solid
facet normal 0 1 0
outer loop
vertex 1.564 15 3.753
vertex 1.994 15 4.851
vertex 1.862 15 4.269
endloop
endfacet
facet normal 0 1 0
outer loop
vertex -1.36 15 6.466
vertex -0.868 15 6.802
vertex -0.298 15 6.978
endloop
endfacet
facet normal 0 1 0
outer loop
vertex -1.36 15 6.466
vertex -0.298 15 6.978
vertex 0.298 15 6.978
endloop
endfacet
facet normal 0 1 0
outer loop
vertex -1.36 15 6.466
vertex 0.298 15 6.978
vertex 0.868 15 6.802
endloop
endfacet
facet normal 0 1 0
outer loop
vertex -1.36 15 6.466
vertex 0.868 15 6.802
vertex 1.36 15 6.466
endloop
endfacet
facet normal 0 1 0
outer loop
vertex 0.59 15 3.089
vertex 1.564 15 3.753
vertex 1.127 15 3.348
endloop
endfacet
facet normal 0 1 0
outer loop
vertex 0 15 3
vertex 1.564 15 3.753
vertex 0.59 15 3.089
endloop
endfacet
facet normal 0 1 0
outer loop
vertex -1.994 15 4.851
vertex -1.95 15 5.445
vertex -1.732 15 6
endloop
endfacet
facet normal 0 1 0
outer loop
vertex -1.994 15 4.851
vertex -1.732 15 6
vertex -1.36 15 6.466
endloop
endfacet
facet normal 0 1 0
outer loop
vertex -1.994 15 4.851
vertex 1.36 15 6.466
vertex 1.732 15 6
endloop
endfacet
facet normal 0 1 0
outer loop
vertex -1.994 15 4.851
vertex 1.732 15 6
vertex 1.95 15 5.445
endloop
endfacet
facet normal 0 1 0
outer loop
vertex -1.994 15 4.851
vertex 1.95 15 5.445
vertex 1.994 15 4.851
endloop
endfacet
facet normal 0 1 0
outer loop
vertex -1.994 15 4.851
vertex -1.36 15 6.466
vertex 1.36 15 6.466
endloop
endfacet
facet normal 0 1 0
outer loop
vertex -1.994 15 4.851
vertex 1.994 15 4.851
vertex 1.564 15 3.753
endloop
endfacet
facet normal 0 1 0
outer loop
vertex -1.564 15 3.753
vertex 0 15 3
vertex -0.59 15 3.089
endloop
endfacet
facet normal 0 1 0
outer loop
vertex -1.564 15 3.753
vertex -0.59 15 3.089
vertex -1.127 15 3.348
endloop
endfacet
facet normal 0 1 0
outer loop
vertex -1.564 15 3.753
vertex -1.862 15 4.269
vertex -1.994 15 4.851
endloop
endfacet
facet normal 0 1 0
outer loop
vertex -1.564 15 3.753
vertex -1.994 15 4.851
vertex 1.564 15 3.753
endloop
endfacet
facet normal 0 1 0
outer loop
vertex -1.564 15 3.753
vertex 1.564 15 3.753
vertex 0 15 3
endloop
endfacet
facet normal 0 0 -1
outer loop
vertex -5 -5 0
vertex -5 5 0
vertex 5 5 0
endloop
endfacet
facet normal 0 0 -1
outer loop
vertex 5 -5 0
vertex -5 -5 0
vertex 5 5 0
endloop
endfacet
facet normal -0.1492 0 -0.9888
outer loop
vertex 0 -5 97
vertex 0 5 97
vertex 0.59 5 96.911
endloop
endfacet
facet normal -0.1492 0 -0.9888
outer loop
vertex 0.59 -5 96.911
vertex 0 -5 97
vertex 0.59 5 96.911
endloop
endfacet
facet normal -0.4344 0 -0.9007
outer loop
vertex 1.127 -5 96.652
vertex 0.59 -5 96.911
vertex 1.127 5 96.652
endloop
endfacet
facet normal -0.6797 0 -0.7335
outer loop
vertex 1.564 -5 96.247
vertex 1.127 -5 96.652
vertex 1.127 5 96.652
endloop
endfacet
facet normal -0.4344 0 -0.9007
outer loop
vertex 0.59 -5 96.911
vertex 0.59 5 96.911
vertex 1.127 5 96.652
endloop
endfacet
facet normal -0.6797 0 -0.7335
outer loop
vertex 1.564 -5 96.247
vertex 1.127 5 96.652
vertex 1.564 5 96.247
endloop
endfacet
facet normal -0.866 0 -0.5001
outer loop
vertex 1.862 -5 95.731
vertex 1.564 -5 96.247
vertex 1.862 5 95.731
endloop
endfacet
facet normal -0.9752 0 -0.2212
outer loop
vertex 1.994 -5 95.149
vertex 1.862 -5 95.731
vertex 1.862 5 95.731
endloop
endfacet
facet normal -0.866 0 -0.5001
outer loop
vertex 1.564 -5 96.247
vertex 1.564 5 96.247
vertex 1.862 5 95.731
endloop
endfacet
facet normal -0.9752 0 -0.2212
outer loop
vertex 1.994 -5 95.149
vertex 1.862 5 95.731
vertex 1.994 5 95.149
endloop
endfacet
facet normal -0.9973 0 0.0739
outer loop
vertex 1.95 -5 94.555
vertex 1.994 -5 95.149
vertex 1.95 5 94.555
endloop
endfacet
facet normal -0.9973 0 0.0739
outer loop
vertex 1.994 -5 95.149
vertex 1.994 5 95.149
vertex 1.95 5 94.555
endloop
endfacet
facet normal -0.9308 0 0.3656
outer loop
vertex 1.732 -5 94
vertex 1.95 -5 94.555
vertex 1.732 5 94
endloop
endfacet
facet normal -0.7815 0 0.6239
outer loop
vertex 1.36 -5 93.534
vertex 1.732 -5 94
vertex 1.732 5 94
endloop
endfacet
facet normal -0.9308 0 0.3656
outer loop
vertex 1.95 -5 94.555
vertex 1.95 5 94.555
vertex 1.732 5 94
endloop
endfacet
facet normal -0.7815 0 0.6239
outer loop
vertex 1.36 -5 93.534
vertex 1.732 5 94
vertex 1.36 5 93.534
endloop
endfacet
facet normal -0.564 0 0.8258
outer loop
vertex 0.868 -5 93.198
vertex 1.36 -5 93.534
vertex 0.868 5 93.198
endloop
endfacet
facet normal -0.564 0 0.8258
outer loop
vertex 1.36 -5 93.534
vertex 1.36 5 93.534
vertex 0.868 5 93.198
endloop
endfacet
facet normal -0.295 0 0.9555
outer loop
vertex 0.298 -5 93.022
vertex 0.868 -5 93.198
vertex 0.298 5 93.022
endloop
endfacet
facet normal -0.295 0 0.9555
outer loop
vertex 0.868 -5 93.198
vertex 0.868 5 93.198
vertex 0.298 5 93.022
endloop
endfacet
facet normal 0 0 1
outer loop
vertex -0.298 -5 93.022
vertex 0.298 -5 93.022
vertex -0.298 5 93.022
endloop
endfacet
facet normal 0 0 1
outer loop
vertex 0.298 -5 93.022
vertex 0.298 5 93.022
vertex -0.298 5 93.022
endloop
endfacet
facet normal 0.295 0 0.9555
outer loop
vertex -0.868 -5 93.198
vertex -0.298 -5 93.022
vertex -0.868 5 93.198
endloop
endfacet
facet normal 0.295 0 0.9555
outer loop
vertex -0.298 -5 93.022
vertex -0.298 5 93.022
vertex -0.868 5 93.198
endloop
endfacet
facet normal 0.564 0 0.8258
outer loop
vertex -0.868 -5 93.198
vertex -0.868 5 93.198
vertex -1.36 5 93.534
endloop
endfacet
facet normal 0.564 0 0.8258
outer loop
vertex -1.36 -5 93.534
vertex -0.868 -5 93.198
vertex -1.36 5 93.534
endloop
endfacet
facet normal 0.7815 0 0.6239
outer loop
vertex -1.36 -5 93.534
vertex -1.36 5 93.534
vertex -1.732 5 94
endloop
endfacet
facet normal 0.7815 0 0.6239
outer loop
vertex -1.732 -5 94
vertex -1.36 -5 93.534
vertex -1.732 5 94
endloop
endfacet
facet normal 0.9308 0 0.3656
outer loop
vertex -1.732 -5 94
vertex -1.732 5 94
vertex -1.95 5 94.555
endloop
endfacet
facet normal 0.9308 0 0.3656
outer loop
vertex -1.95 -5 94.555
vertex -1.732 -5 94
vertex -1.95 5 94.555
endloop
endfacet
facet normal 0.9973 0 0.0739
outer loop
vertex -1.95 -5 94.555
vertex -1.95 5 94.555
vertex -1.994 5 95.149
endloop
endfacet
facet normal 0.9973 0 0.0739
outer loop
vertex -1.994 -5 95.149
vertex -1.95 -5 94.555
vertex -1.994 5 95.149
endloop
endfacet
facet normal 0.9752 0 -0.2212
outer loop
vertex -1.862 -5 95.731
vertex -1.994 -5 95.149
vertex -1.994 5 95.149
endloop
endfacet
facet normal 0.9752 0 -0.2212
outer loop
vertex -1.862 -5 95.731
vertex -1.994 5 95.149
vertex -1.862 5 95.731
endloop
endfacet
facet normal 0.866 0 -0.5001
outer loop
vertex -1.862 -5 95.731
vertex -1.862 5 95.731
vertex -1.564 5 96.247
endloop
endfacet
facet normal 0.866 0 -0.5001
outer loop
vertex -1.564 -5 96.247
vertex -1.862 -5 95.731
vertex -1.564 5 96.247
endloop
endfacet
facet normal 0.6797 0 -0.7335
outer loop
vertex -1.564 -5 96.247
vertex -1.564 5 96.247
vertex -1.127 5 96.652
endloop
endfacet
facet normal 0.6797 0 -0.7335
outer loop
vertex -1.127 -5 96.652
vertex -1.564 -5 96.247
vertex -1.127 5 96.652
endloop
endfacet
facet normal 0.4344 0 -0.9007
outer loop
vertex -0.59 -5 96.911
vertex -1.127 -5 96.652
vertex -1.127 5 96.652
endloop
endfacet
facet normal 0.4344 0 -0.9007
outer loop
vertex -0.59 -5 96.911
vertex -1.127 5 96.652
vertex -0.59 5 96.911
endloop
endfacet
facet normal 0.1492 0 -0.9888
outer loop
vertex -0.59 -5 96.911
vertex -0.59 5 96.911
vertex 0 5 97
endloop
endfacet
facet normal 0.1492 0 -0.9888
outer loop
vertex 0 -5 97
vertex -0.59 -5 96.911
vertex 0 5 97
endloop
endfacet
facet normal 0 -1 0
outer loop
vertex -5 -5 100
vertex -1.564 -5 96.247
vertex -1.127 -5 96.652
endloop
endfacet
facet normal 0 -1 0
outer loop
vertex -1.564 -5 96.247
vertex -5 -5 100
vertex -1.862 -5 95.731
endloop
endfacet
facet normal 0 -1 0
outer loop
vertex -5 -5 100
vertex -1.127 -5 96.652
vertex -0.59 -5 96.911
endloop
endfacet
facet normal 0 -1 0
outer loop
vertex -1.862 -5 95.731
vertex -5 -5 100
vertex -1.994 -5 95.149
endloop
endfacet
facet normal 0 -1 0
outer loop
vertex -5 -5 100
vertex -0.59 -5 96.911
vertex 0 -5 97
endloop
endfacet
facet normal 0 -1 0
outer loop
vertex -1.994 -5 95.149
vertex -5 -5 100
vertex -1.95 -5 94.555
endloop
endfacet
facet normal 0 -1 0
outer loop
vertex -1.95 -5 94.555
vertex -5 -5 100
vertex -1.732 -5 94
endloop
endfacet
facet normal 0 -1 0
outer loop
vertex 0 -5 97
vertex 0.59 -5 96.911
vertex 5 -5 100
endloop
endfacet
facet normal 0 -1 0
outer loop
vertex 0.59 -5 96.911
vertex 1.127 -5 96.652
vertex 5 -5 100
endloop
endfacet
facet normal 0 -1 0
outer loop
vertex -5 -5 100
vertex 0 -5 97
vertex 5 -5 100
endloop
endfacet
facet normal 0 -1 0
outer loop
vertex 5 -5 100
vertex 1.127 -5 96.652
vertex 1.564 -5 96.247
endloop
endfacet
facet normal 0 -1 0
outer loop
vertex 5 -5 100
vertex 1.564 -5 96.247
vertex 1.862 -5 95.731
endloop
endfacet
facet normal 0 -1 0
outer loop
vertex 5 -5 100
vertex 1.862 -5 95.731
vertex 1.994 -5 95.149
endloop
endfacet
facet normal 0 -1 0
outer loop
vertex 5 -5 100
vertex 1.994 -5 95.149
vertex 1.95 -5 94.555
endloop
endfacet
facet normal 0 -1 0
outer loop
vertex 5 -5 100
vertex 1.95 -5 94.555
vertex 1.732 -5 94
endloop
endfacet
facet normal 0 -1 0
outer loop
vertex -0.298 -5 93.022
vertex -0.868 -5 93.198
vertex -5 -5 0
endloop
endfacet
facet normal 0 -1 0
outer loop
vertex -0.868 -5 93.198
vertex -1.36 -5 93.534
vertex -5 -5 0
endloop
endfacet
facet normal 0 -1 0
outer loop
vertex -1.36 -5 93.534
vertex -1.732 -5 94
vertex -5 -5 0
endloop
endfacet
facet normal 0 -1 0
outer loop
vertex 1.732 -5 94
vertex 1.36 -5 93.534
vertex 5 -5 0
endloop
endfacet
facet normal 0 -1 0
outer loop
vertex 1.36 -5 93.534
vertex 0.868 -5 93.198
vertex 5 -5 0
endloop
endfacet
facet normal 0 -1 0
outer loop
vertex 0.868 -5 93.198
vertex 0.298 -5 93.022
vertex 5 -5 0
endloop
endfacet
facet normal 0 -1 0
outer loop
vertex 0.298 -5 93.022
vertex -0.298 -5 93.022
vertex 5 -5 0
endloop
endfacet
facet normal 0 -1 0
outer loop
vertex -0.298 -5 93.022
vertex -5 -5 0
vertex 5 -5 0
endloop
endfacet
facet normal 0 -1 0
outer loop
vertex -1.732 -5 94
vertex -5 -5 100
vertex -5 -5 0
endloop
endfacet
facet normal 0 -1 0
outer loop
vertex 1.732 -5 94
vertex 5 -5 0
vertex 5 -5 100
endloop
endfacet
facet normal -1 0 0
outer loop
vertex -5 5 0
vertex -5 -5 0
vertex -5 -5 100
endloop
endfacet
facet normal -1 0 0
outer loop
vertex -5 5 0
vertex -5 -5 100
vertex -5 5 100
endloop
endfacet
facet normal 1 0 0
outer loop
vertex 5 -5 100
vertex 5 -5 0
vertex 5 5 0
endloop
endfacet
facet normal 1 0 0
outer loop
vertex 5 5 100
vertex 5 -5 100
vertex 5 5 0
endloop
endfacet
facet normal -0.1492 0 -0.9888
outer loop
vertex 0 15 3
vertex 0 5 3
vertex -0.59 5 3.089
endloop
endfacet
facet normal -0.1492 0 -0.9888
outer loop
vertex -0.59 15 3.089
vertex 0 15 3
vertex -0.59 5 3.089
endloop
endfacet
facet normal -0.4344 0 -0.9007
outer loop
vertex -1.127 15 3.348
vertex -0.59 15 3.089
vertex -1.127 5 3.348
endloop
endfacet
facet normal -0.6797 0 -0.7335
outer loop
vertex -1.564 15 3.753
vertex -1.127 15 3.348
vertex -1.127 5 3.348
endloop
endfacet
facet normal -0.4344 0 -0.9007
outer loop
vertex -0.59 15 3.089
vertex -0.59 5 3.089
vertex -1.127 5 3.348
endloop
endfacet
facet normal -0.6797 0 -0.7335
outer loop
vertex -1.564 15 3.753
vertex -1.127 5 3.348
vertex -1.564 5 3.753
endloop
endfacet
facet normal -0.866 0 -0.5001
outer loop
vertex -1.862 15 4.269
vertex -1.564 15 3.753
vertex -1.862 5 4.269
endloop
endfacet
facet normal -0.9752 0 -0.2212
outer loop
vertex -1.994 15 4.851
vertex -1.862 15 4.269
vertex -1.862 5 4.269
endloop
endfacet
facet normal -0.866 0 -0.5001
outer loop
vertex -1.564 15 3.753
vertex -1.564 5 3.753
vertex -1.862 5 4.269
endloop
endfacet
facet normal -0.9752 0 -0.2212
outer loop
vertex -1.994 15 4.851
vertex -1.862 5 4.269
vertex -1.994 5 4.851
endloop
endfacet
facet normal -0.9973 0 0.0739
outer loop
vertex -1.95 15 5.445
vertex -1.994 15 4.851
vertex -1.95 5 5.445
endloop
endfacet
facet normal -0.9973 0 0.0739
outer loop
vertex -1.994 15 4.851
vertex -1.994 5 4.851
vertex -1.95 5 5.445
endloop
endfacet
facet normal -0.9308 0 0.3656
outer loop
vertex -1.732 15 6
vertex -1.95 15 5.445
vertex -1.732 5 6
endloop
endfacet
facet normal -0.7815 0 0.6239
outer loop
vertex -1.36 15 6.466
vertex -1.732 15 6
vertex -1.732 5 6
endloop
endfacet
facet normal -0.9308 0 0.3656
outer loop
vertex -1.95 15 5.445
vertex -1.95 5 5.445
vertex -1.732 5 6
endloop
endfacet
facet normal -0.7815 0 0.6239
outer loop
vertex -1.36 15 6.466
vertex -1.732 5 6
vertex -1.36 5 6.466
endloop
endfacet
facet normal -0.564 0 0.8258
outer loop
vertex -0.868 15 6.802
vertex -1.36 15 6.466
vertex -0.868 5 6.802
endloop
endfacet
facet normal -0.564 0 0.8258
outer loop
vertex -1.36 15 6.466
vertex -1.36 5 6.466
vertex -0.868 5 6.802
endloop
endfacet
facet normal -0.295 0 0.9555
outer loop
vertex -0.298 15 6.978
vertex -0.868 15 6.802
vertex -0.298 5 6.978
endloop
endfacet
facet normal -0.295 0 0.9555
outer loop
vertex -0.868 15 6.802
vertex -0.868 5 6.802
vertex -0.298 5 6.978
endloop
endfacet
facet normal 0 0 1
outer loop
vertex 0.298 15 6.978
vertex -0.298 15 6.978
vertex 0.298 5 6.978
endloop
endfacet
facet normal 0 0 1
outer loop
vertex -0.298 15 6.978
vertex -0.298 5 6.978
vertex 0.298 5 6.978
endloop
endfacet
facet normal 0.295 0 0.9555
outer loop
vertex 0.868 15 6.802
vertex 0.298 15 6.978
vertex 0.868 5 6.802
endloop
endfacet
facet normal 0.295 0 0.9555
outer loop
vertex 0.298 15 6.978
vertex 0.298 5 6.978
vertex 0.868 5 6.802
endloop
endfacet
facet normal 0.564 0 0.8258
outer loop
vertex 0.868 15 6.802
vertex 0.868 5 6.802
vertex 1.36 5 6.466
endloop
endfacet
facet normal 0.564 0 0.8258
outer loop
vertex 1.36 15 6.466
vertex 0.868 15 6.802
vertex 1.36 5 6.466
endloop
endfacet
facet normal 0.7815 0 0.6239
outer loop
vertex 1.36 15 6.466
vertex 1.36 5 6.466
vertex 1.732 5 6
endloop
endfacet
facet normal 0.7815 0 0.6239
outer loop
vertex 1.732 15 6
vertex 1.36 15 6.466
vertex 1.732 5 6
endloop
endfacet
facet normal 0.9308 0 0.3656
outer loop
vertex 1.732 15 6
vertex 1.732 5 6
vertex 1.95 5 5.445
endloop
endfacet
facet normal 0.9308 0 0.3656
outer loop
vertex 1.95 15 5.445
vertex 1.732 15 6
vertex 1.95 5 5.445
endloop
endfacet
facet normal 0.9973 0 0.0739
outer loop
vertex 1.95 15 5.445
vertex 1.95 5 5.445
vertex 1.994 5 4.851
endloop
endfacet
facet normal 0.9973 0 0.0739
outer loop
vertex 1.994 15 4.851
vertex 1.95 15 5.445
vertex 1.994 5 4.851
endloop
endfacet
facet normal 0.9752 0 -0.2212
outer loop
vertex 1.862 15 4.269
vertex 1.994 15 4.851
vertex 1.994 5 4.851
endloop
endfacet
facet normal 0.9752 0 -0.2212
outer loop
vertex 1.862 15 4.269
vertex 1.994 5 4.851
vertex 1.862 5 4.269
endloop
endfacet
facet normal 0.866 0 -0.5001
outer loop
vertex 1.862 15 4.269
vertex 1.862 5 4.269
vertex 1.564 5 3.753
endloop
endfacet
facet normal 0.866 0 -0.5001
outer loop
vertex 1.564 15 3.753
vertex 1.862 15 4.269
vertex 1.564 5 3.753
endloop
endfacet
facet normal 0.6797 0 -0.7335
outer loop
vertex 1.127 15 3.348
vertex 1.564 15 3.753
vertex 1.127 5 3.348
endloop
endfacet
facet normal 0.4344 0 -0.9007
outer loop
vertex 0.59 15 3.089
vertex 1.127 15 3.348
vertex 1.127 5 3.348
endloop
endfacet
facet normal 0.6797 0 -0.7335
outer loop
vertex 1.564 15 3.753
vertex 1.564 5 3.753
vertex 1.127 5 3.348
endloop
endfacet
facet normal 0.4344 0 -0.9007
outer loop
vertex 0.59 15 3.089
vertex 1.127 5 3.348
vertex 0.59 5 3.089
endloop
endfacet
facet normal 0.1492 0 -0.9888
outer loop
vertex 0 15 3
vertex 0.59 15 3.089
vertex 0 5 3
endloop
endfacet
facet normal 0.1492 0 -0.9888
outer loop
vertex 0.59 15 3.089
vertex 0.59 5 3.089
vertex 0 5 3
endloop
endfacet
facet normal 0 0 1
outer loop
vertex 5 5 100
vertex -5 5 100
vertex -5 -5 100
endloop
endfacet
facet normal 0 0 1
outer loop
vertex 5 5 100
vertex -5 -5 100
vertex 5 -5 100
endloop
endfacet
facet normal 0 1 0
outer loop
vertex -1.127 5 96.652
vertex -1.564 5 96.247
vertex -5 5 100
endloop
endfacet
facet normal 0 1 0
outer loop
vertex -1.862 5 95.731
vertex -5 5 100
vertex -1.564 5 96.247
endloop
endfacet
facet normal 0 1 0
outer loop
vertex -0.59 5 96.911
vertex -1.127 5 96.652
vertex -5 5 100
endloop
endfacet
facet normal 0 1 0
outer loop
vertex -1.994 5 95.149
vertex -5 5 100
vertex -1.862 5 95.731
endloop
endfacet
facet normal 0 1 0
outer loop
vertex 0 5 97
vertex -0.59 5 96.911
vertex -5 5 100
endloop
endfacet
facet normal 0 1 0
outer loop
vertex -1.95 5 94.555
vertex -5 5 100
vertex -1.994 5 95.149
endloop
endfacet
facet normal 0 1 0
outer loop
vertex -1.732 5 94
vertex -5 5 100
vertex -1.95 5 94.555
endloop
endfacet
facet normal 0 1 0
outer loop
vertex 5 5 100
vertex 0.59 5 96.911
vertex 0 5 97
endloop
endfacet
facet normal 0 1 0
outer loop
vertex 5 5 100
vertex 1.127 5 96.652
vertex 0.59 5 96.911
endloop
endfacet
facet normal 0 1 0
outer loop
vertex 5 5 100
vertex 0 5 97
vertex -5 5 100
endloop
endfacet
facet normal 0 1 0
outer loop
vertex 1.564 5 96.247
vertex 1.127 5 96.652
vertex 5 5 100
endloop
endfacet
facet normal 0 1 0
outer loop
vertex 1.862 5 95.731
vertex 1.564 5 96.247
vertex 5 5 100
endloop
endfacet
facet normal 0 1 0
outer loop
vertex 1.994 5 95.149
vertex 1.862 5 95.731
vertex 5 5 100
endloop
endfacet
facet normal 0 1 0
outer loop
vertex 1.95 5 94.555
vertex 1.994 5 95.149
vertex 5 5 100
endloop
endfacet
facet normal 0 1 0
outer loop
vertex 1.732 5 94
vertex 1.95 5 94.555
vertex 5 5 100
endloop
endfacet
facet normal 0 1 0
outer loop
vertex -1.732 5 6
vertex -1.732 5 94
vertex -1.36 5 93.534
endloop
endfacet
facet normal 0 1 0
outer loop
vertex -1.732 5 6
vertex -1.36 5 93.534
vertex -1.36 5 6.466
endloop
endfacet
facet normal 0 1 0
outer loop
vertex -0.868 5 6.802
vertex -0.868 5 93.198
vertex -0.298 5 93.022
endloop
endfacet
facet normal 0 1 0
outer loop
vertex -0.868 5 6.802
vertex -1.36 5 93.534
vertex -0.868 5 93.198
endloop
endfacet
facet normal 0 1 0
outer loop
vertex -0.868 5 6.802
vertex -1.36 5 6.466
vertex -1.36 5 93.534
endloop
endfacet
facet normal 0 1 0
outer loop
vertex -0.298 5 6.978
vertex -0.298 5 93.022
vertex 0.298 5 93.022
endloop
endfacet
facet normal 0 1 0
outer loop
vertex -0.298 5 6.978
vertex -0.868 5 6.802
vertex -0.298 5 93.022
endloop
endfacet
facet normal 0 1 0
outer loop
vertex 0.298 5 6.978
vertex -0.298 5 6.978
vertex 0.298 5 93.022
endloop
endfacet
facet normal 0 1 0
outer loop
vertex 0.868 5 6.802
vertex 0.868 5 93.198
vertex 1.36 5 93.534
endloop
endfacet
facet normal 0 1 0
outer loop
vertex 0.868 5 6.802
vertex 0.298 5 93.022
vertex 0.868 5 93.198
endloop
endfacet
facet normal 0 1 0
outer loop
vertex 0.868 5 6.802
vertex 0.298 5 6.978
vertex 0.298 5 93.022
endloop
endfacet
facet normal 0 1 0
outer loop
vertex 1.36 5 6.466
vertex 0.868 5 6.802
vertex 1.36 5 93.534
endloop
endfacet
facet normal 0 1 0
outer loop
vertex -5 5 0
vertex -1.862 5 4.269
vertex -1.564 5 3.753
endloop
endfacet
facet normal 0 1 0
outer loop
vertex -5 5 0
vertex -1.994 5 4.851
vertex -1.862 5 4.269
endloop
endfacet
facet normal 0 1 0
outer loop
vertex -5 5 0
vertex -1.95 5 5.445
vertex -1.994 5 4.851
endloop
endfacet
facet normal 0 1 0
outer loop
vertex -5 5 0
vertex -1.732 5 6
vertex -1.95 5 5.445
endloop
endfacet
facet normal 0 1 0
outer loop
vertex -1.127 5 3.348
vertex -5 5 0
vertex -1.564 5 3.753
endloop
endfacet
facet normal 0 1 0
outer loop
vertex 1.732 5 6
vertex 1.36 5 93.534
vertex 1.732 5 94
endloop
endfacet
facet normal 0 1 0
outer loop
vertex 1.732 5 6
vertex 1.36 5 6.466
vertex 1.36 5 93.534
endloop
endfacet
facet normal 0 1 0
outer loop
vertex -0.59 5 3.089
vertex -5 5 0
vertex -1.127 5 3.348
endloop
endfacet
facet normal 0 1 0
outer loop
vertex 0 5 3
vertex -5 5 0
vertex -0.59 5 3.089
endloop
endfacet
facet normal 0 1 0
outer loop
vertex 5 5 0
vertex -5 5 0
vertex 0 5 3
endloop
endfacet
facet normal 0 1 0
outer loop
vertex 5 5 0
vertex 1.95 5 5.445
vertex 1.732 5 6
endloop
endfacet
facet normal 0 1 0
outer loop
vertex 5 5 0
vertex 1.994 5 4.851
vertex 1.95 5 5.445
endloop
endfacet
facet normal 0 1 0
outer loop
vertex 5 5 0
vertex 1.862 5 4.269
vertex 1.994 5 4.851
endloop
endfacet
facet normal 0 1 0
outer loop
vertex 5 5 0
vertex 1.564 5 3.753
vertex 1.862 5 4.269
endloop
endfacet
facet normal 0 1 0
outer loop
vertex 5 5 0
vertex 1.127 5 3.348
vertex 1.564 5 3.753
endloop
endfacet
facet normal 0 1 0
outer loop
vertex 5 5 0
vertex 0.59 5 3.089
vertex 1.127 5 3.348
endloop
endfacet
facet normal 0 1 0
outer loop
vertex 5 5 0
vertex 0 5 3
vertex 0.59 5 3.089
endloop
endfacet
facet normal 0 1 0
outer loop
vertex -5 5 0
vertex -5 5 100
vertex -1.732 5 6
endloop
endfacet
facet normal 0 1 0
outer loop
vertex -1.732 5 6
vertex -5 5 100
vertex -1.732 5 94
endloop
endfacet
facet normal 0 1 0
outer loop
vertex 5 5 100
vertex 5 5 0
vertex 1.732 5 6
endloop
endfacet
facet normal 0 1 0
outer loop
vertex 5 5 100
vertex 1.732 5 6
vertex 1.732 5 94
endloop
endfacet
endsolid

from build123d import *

# Parameters (mm, degrees)
SKETCH2_W           = 10
SKETCH2_H           = 10
BOSS_EXTRUDE1_DEPTH = 100
CUT_EXTRUDE1_REACH  = 102.623
SKETCH3_R           = 2
SKETCH4_R           = 2
BOSS_EXTRUDE2_DEPTH = 10


with BuildPart() as part:
    # Sketch2 → Boss-Extrude1 (new body)
    with BuildSketch(Plane.XY):
        Rectangle(SKETCH2_W, SKETCH2_H)
    extrude(amount=BOSS_EXTRUDE1_DEPTH)

    # Sketch3 → Cut-Extrude1 (cut, up to next)
    with BuildSketch(Plane(origin=(0, 5, 0), x_dir=(1, 0, 0), z_dir=(0, 1, 0)), mode=Mode.PRIVATE) as cut_extrude1_sk1:
        with Locations(Location((0, -95, 0), (0, 0, 270))):
            Circle(SKETCH3_R)
    cut_extrude1_tool1 = extrude(cut_extrude1_sk1.sketch, amount=-CUT_EXTRUDE1_REACH, mode=Mode.PRIVATE) & part.part
    add(cut_extrude1_tool1.solids().sort_by_distance((0, 5, 95))[0], mode=Mode.SUBTRACT)

    # Sketch4 → Boss-Extrude2 (add)
    with BuildSketch(Plane(origin=(0, 5, 0), x_dir=(1, 0, 0), z_dir=(0, 1, 0))):
        with Locations(Location((0, -5, 0), (0, 0, 90))):
            Circle(SKETCH4_R)
    extrude(amount=BOSS_EXTRUDE2_DEPTH)


solid = part.part
